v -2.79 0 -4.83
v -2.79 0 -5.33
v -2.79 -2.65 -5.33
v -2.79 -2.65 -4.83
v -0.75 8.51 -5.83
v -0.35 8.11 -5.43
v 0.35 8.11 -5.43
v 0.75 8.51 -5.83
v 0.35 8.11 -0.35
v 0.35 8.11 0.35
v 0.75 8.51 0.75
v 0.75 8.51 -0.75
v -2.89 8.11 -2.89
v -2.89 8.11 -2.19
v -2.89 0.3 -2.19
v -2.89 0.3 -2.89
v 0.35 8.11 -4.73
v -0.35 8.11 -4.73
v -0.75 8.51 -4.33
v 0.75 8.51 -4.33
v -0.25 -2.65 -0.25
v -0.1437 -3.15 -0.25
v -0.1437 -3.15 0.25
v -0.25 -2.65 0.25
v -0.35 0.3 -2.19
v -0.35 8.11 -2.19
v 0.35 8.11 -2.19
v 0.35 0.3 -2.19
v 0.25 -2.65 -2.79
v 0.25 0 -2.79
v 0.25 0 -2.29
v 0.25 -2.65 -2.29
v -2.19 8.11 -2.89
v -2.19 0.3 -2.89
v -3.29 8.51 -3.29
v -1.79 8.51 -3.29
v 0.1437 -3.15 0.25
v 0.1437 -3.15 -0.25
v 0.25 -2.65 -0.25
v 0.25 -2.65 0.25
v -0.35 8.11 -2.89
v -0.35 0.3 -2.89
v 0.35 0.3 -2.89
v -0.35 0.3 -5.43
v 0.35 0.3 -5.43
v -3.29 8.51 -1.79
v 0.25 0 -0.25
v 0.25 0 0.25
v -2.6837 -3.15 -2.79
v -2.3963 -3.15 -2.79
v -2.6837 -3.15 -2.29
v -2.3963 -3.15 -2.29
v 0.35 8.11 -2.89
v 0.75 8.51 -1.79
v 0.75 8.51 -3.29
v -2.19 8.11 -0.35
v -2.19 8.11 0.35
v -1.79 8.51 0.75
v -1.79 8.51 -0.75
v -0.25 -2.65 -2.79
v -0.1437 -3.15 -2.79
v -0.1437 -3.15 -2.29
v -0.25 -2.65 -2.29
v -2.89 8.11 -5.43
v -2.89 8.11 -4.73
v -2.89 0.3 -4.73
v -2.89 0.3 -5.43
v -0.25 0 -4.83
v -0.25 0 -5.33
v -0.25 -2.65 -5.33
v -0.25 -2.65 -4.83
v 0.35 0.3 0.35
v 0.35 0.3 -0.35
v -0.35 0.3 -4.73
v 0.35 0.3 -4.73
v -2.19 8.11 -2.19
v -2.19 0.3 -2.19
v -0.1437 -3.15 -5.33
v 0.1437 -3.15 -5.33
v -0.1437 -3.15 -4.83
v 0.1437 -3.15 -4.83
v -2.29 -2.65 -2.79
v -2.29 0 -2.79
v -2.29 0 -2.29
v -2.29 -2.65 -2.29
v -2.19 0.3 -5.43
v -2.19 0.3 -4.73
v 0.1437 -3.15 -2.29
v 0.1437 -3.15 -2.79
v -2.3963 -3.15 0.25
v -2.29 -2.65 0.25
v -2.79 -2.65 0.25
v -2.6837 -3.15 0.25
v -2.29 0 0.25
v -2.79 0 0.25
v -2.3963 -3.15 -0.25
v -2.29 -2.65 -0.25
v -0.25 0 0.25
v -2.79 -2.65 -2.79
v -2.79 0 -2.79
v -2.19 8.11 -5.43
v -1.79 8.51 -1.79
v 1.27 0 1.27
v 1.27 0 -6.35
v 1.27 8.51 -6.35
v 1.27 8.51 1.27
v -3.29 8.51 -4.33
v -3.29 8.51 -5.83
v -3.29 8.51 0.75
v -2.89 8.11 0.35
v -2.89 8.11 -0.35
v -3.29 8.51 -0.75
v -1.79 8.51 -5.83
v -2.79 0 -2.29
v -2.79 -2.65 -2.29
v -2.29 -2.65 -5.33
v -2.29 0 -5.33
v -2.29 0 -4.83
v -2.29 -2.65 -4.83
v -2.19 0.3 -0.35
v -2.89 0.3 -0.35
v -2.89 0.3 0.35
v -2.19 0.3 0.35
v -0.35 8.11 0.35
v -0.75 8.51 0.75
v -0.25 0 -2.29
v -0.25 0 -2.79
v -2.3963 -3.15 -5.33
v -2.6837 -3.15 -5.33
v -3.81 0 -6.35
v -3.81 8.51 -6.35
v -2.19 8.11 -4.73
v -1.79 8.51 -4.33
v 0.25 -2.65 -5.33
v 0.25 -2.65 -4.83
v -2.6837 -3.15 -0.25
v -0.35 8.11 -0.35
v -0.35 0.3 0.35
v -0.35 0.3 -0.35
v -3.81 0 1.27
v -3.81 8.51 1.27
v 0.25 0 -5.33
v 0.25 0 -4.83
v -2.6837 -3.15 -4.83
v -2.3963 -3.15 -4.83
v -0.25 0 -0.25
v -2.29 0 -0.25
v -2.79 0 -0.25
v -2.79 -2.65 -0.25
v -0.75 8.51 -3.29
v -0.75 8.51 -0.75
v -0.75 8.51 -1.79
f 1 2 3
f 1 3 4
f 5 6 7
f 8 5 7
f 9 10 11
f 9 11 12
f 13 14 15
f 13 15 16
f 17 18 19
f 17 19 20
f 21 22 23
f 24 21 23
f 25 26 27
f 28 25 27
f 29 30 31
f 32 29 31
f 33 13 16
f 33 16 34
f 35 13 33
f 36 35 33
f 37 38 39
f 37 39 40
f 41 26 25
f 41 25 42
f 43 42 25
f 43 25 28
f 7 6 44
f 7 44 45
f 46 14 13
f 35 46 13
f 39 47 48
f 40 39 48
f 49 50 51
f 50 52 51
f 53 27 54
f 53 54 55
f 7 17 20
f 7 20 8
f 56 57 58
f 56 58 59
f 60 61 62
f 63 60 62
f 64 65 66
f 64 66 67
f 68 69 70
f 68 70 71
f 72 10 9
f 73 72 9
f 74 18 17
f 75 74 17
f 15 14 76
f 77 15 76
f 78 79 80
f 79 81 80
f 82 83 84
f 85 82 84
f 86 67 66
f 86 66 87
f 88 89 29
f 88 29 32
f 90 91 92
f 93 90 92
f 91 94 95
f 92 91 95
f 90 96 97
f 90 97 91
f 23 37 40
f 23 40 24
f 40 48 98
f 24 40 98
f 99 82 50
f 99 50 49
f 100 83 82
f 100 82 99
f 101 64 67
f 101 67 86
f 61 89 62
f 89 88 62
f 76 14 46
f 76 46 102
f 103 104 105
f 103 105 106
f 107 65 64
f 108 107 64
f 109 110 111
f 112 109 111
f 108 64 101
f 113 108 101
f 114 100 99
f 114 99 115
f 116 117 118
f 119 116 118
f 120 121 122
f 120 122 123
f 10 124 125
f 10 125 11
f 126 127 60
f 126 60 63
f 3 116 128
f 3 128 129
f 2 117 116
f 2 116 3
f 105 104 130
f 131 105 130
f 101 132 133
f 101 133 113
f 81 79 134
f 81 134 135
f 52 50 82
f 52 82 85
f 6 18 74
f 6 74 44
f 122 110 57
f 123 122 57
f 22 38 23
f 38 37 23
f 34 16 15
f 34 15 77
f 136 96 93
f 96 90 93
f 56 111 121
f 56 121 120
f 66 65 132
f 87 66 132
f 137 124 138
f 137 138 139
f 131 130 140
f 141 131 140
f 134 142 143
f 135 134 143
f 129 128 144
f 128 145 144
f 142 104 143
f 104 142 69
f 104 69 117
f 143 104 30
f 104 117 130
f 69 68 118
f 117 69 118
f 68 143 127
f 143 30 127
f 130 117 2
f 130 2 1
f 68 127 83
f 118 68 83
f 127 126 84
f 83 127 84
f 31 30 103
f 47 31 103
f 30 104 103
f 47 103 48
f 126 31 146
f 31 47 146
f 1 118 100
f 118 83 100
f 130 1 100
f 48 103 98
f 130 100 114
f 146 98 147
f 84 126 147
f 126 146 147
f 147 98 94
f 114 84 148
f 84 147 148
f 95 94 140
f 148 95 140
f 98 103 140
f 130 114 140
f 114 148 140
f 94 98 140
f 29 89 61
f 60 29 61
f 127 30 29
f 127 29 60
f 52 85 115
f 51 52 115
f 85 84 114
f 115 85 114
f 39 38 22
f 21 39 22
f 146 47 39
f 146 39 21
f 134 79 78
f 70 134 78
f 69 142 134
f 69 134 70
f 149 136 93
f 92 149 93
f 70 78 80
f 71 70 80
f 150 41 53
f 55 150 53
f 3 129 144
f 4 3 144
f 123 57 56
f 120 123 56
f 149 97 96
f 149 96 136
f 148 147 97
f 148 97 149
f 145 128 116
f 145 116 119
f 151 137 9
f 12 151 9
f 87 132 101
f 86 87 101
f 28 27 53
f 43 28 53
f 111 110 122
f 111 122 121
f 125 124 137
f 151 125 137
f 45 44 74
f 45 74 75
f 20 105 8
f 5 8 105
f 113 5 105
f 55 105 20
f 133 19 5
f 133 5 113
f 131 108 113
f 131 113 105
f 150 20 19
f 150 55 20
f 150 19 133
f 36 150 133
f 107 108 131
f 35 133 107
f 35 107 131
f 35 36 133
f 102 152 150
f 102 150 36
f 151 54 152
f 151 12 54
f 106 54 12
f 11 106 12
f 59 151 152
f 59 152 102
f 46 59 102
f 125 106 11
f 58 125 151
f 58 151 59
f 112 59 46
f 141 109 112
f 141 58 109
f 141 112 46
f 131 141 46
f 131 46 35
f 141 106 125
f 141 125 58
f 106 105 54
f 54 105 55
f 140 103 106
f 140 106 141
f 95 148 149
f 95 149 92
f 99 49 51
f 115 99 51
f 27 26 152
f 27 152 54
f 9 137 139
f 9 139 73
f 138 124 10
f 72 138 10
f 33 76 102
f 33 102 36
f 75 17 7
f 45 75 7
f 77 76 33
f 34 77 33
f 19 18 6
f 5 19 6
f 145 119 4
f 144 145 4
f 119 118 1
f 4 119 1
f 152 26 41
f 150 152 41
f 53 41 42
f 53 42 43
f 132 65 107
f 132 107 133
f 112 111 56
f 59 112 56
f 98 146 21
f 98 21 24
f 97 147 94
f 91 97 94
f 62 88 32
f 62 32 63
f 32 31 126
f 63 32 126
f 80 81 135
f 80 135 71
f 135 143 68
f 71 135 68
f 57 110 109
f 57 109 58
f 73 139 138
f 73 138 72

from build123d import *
from OCP.BRepFilletAPI import BRepFilletAPI_MakeChamfer

# Parameters (mm, degrees)
SKETCH_1_W                          = 2.54
SKETCH_1_H                          = 2.54
EXTRUDE_1_DEPTH                     = 8.51
SKETCH_4_W                          = 0.7
SKETCH_4_H                          = 0.7
CUT_EXTRUDE_1_DEPTH                 = 8.21
CHAMFER_3_SIZE                      = 0.4
SKETCH_2_W                          = 0.5
SKETCH_2_H                          = 0.5
EXTRUDE_2_DEPTH                     = 3.15
CHAMFER_2_SIZE                      = 0.5
CHAMFER_2_SIZE2                     = 0.106278281
PATTERN_LINEAR_1_COUNT              = 3
PATTERN_LINEAR_1_PITCH              = 2.54
PATTERN_LINEAR_1_COUNT_DIR2         = 2
PATTERN_LINEAR_1_PITCH_DIR2         = 2.54
CHAMFER_3_OF_PATTERN_LINEAR_1_SIZE  = 0.4
CHAMFER_2_OF_PATTERN_LINEAR_1_SIZE  = 0.5
CHAMFER_2_OF_PATTERN_LINEAR_1_SIZE2 = 0.106278281


with BuildPart() as part:
    # Эскиз1 → Бобышка-Вытянуть1 (new body)
    with BuildSketch(Plane(origin=(0, 0, 0), x_dir=(-1, 0, 0), z_dir=(0, 1, 0))):
        Rectangle(SKETCH_1_W, SKETCH_1_H)
    extrude_1 = extrude(amount=EXTRUDE_1_DEPTH)

    # Эскиз4 → Вырез-Вытянуть1 (cut)
    with BuildSketch(Plane(origin=(0, 8.51, 0), x_dir=(1, 0, 0), z_dir=(0, 1, 0))):
        Rectangle(SKETCH_4_W, SKETCH_4_H)
    cut_extrude_1 = extrude(amount=-CUT_EXTRUDE_1_DEPTH, mode=Mode.SUBTRACT)

    # Фаска3
    chamfer_3_edges = [part.edges().sort_by_distance(p)[0] for p in [
        (-0.35, 8.51, 0),
        (0, 8.51, 0.35),
        (0.35, 8.51, 0),
        (0, 8.51, -0.35),
    ]]
    chamfer(chamfer_3_edges, length=CHAMFER_3_SIZE)

    # Эскиз2 → Бобышка-Вытянуть2 (add)
    with BuildSketch(Plane(origin=(0, 0, 0), x_dir=(-1, 0, 0), z_dir=(0, 1, 0))):
        Rectangle(SKETCH_2_W, SKETCH_2_H)
    extrude_2 = extrude(amount=-EXTRUDE_2_DEPTH)

    # Фаска2: one chamfer whose edges measure the first distance from different faces: ONE call of the kernel's chamfer builder (chamfer() names one face for all edges)
    chamfer_2_edges_1 = [part.edges().sort_by_distance(p)[0] for p in [
        (-0.25, -3.15, 0),
    ]]
    chamfer_2_side_1 = [part.faces().sort_by_distance(p)[0] for p in [
        (-0.25, -1.575, 0),
    ]]
    chamfer_2_edges_2 = [part.edges().sort_by_distance(p)[0] for p in [
        (0.25, -3.15, 0),
    ]]
    chamfer_2_side_2 = [part.faces().sort_by_distance(p)[0] for p in [
        (0.25, -1.575, 0),
    ]]
    chamfer_2 = BRepFilletAPI_MakeChamfer(part.part.solid().wrapped)
    for e in chamfer_2_edges_1:
        chamfer_2.Add(CHAMFER_2_SIZE, CHAMFER_2_SIZE2, e.wrapped, chamfer_2_side_1[0].wrapped)  # the first distance lies on this face
    for e in chamfer_2_edges_2:
        chamfer_2.Add(CHAMFER_2_SIZE, CHAMFER_2_SIZE2, e.wrapped, chamfer_2_side_2[0].wrapped)  # the first distance lies on this face
    add(Compound.cast(chamfer_2.Shape()), mode=Mode.REPLACE)

    # Линейный массив1: Бобышка-Вытянуть1, Вырез-Вытянуть1, Extrude 2 3 × 2
    with Locations(*[(-j * PATTERN_LINEAR_1_PITCH_DIR2, 0, -i * PATTERN_LINEAR_1_PITCH) for i in range(PATTERN_LINEAR_1_COUNT) for j in range(PATTERN_LINEAR_1_COUNT_DIR2) if (i, j) != (0, 0)]):
        add(extrude_1)
        add(cut_extrude_1, mode=Mode.SUBTRACT)
        add(extrude_2)

    # Фаска3 of Линейный массив1
    chamfer_3_of_pattern_linear_1_edges = [part.edges().sort_by_distance(p)[0] for p in [
        (-2.89, 8.51, 0),
        (-2.54, 8.51, 0.35),
        (-2.19, 8.51, 0),
        (-2.54, 8.51, -0.35),
        (-0.35, 8.51, -2.54),
        (0, 8.51, -2.19),
        (0.35, 8.51, -2.54),
        (0, 8.51, -2.89),
        (-2.89, 8.51, -2.54),
        (-2.54, 8.51, -2.19),
        (-2.19, 8.51, -2.54),
        (-2.54, 8.51, -2.89),
        (-0.35, 8.51, -5.08),
        (0, 8.51, -4.73),
        (0.35, 8.51, -5.08),
        (0, 8.51, -5.43),
        (-2.89, 8.51, -5.08),
        (-2.54, 8.51, -4.73),
        (-2.19, 8.51, -5.08),
        (-2.54, 8.51, -5.43),
    ]]
    chamfer(chamfer_3_of_pattern_linear_1_edges, length=CHAMFER_3_OF_PATTERN_LINEAR_1_SIZE)

    # Фаска2 of Линейный массив1: one chamfer whose edges measure the first distance from different faces: ONE call of the kernel's chamfer builder (chamfer() names one face for all edges)
    chamfer_2_of_pattern_linear_1_edges_1 = [part.edges().sort_by_distance(p)[0] for p in [
        (-2.79, -3.15, 0),
    ]]
    chamfer_2_of_pattern_linear_1_side_1 = [part.faces().sort_by_distance(p)[0] for p in [
        (-2.79, -1.575, 0),
    ]]
    chamfer_2_of_pattern_linear_1_edges_2 = [part.edges().sort_by_distance(p)[0] for p in [
        (-2.29, -3.15, 0),
    ]]
    chamfer_2_of_pattern_linear_1_side_2 = [part.faces().sort_by_distance(p)[0] for p in [
        (-2.29, -1.575, 0),
    ]]
    chamfer_2_of_pattern_linear_1_edges_3 = [part.edges().sort_by_distance(p)[0] for p in [
        (-0.25, -3.15, -2.54),
    ]]
    chamfer_2_of_pattern_linear_1_side_3 = [part.faces().sort_by_distance(p)[0] for p in [
        (-0.25, -1.575, -2.54),
    ]]
    chamfer_2_of_pattern_linear_1_edges_4 = [part.edges().sort_by_distance(p)[0] for p in [
        (0.25, -3.15, -2.54),
    ]]
    chamfer_2_of_pattern_linear_1_side_4 = [part.faces().sort_by_distance(p)[0] for p in [
        (0.25, -1.575, -2.54),
    ]]
    chamfer_2_of_pattern_linear_1_edges_5 = [part.edges().sort_by_distance(p)[0] for p in [
        (-2.79, -3.15, -2.54),
    ]]
    chamfer_2_of_pattern_linear_1_side_5 = [part.faces().sort_by_distance(p)[0] for p in [
        (-2.79, -1.575, -2.54),
    ]]
    chamfer_2_of_pattern_linear_1_edges_6 = [part.edges().sort_by_distance(p)[0] for p in [
        (-2.29, -3.15, -2.54),
    ]]
    chamfer_2_of_pattern_linear_1_side_6 = [part.faces().sort_by_distance(p)[0] for p in [
        (-2.29, -1.575, -2.54),
    ]]
    chamfer_2_of_pattern_linear_1_edges_7 = [part.edges().sort_by_distance(p)[0] for p in [
        (-0.25, -3.15, -5.08),
    ]]
    chamfer_2_of_pattern_linear_1_side_7 = [part.faces().sort_by_distance(p)[0] for p in [
        (-0.25, -1.575, -5.08),
    ]]
    chamfer_2_of_pattern_linear_1_edges_8 = [part.edges().sort_by_distance(p)[0] for p in [
        (0.25, -3.15, -5.08),
    ]]
    chamfer_2_of_pattern_linear_1_side_8 = [part.faces().sort_by_distance(p)[0] for p in [
        (0.25, -1.575, -5.08),
    ]]
    chamfer_2_of_pattern_linear_1_edges_9 = [part.edges().sort_by_distance(p)[0] for p in [
        (-2.79, -3.15, -5.08),
    ]]
    chamfer_2_of_pattern_linear_1_side_9 = [part.faces().sort_by_distance(p)[0] for p in [
        (-2.79, -1.575, -5.08),
    ]]
    chamfer_2_of_pattern_linear_1_edges_10 = [part.edges().sort_by_distance(p)[0] for p in [
        (-2.29, -3.15, -5.08),
    ]]
    chamfer_2_of_pattern_linear_1_side_10 = [part.faces().sort_by_distance(p)[0] for p in [
        (-2.29, -1.575, -5.08),
    ]]
    chamfer_2_of_pattern_linear_1 = BRepFilletAPI_MakeChamfer(part.part.solid().wrapped)
    for e in chamfer_2_of_pattern_linear_1_edges_1:
        chamfer_2_of_pattern_linear_1.Add(CHAMFER_2_OF_PATTERN_LINEAR_1_SIZE, CHAMFER_2_OF_PATTERN_LINEAR_1_SIZE2, e.wrapped, chamfer_2_of_pattern_linear_1_side_1[0].wrapped)  # the first distance lies on this face
    for e in chamfer_2_of_pattern_linear_1_edges_2:
        chamfer_2_of_pattern_linear_1.Add(CHAMFER_2_OF_PATTERN_LINEAR_1_SIZE, CHAMFER_2_OF_PATTERN_LINEAR_1_SIZE2, e.wrapped, chamfer_2_of_pattern_linear_1_side_2[0].wrapped)  # the first distance lies on this face
    for e in chamfer_2_of_pattern_linear_1_edges_3:
        chamfer_2_of_pattern_linear_1.Add(CHAMFER_2_OF_PATTERN_LINEAR_1_SIZE, CHAMFER_2_OF_PATTERN_LINEAR_1_SIZE2, e.wrapped, chamfer_2_of_pattern_linear_1_side_3[0].wrapped)  # the first distance lies on this face
    for e in chamfer_2_of_pattern_linear_1_edges_4:
        chamfer_2_of_pattern_linear_1.Add(CHAMFER_2_OF_PATTERN_LINEAR_1_SIZE, CHAMFER_2_OF_PATTERN_LINEAR_1_SIZE2, e.wrapped, chamfer_2_of_pattern_linear_1_side_4[0].wrapped)  # the first distance lies on this face
    for e in chamfer_2_of_pattern_linear_1_edges_5:
        chamfer_2_of_pattern_linear_1.Add(CHAMFER_2_OF_PATTERN_LINEAR_1_SIZE, CHAMFER_2_OF_PATTERN_LINEAR_1_SIZE2, e.wrapped, chamfer_2_of_pattern_linear_1_side_5[0].wrapped)  # the first distance lies on this face
    for e in chamfer_2_of_pattern_linear_1_edges_6:
        chamfer_2_of_pattern_linear_1.Add(CHAMFER_2_OF_PATTERN_LINEAR_1_SIZE, CHAMFER_2_OF_PATTERN_LINEAR_1_SIZE2, e.wrapped, chamfer_2_of_pattern_linear_1_side_6[0].wrapped)  # the first distance lies on this face
    for e in chamfer_2_of_pattern_linear_1_edges_7:
        chamfer_2_of_pattern_linear_1.Add(CHAMFER_2_OF_PATTERN_LINEAR_1_SIZE, CHAMFER_2_OF_PATTERN_LINEAR_1_SIZE2, e.wrapped, chamfer_2_of_pattern_linear_1_side_7[0].wrapped)  # the first distance lies on this face
    for e in chamfer_2_of_pattern_linear_1_edges_8:
        chamfer_2_of_pattern_linear_1.Add(CHAMFER_2_OF_PATTERN_LINEAR_1_SIZE, CHAMFER_2_OF_PATTERN_LINEAR_1_SIZE2, e.wrapped, chamfer_2_of_pattern_linear_1_side_8[0].wrapped)  # the first distance lies on this face
    for e in chamfer_2_of_pattern_linear_1_edges_9:
        chamfer_2_of_pattern_linear_1.Add(CHAMFER_2_OF_PATTERN_LINEAR_1_SIZE, CHAMFER_2_OF_PATTERN_LINEAR_1_SIZE2, e.wrapped, chamfer_2_of_pattern_linear_1_side_9[0].wrapped)  # the first distance lies on this face
    for e in chamfer_2_of_pattern_linear_1_edges_10:
        chamfer_2_of_pattern_linear_1.Add(CHAMFER_2_OF_PATTERN_LINEAR_1_SIZE, CHAMFER_2_OF_PATTERN_LINEAR_1_SIZE2, e.wrapped, chamfer_2_of_pattern_linear_1_side_10[0].wrapped)  # the first distance lies on this face
    add(Compound.cast(chamfer_2_of_pattern_linear_1.Shape()), mode=Mode.REPLACE)


solid = part.part
